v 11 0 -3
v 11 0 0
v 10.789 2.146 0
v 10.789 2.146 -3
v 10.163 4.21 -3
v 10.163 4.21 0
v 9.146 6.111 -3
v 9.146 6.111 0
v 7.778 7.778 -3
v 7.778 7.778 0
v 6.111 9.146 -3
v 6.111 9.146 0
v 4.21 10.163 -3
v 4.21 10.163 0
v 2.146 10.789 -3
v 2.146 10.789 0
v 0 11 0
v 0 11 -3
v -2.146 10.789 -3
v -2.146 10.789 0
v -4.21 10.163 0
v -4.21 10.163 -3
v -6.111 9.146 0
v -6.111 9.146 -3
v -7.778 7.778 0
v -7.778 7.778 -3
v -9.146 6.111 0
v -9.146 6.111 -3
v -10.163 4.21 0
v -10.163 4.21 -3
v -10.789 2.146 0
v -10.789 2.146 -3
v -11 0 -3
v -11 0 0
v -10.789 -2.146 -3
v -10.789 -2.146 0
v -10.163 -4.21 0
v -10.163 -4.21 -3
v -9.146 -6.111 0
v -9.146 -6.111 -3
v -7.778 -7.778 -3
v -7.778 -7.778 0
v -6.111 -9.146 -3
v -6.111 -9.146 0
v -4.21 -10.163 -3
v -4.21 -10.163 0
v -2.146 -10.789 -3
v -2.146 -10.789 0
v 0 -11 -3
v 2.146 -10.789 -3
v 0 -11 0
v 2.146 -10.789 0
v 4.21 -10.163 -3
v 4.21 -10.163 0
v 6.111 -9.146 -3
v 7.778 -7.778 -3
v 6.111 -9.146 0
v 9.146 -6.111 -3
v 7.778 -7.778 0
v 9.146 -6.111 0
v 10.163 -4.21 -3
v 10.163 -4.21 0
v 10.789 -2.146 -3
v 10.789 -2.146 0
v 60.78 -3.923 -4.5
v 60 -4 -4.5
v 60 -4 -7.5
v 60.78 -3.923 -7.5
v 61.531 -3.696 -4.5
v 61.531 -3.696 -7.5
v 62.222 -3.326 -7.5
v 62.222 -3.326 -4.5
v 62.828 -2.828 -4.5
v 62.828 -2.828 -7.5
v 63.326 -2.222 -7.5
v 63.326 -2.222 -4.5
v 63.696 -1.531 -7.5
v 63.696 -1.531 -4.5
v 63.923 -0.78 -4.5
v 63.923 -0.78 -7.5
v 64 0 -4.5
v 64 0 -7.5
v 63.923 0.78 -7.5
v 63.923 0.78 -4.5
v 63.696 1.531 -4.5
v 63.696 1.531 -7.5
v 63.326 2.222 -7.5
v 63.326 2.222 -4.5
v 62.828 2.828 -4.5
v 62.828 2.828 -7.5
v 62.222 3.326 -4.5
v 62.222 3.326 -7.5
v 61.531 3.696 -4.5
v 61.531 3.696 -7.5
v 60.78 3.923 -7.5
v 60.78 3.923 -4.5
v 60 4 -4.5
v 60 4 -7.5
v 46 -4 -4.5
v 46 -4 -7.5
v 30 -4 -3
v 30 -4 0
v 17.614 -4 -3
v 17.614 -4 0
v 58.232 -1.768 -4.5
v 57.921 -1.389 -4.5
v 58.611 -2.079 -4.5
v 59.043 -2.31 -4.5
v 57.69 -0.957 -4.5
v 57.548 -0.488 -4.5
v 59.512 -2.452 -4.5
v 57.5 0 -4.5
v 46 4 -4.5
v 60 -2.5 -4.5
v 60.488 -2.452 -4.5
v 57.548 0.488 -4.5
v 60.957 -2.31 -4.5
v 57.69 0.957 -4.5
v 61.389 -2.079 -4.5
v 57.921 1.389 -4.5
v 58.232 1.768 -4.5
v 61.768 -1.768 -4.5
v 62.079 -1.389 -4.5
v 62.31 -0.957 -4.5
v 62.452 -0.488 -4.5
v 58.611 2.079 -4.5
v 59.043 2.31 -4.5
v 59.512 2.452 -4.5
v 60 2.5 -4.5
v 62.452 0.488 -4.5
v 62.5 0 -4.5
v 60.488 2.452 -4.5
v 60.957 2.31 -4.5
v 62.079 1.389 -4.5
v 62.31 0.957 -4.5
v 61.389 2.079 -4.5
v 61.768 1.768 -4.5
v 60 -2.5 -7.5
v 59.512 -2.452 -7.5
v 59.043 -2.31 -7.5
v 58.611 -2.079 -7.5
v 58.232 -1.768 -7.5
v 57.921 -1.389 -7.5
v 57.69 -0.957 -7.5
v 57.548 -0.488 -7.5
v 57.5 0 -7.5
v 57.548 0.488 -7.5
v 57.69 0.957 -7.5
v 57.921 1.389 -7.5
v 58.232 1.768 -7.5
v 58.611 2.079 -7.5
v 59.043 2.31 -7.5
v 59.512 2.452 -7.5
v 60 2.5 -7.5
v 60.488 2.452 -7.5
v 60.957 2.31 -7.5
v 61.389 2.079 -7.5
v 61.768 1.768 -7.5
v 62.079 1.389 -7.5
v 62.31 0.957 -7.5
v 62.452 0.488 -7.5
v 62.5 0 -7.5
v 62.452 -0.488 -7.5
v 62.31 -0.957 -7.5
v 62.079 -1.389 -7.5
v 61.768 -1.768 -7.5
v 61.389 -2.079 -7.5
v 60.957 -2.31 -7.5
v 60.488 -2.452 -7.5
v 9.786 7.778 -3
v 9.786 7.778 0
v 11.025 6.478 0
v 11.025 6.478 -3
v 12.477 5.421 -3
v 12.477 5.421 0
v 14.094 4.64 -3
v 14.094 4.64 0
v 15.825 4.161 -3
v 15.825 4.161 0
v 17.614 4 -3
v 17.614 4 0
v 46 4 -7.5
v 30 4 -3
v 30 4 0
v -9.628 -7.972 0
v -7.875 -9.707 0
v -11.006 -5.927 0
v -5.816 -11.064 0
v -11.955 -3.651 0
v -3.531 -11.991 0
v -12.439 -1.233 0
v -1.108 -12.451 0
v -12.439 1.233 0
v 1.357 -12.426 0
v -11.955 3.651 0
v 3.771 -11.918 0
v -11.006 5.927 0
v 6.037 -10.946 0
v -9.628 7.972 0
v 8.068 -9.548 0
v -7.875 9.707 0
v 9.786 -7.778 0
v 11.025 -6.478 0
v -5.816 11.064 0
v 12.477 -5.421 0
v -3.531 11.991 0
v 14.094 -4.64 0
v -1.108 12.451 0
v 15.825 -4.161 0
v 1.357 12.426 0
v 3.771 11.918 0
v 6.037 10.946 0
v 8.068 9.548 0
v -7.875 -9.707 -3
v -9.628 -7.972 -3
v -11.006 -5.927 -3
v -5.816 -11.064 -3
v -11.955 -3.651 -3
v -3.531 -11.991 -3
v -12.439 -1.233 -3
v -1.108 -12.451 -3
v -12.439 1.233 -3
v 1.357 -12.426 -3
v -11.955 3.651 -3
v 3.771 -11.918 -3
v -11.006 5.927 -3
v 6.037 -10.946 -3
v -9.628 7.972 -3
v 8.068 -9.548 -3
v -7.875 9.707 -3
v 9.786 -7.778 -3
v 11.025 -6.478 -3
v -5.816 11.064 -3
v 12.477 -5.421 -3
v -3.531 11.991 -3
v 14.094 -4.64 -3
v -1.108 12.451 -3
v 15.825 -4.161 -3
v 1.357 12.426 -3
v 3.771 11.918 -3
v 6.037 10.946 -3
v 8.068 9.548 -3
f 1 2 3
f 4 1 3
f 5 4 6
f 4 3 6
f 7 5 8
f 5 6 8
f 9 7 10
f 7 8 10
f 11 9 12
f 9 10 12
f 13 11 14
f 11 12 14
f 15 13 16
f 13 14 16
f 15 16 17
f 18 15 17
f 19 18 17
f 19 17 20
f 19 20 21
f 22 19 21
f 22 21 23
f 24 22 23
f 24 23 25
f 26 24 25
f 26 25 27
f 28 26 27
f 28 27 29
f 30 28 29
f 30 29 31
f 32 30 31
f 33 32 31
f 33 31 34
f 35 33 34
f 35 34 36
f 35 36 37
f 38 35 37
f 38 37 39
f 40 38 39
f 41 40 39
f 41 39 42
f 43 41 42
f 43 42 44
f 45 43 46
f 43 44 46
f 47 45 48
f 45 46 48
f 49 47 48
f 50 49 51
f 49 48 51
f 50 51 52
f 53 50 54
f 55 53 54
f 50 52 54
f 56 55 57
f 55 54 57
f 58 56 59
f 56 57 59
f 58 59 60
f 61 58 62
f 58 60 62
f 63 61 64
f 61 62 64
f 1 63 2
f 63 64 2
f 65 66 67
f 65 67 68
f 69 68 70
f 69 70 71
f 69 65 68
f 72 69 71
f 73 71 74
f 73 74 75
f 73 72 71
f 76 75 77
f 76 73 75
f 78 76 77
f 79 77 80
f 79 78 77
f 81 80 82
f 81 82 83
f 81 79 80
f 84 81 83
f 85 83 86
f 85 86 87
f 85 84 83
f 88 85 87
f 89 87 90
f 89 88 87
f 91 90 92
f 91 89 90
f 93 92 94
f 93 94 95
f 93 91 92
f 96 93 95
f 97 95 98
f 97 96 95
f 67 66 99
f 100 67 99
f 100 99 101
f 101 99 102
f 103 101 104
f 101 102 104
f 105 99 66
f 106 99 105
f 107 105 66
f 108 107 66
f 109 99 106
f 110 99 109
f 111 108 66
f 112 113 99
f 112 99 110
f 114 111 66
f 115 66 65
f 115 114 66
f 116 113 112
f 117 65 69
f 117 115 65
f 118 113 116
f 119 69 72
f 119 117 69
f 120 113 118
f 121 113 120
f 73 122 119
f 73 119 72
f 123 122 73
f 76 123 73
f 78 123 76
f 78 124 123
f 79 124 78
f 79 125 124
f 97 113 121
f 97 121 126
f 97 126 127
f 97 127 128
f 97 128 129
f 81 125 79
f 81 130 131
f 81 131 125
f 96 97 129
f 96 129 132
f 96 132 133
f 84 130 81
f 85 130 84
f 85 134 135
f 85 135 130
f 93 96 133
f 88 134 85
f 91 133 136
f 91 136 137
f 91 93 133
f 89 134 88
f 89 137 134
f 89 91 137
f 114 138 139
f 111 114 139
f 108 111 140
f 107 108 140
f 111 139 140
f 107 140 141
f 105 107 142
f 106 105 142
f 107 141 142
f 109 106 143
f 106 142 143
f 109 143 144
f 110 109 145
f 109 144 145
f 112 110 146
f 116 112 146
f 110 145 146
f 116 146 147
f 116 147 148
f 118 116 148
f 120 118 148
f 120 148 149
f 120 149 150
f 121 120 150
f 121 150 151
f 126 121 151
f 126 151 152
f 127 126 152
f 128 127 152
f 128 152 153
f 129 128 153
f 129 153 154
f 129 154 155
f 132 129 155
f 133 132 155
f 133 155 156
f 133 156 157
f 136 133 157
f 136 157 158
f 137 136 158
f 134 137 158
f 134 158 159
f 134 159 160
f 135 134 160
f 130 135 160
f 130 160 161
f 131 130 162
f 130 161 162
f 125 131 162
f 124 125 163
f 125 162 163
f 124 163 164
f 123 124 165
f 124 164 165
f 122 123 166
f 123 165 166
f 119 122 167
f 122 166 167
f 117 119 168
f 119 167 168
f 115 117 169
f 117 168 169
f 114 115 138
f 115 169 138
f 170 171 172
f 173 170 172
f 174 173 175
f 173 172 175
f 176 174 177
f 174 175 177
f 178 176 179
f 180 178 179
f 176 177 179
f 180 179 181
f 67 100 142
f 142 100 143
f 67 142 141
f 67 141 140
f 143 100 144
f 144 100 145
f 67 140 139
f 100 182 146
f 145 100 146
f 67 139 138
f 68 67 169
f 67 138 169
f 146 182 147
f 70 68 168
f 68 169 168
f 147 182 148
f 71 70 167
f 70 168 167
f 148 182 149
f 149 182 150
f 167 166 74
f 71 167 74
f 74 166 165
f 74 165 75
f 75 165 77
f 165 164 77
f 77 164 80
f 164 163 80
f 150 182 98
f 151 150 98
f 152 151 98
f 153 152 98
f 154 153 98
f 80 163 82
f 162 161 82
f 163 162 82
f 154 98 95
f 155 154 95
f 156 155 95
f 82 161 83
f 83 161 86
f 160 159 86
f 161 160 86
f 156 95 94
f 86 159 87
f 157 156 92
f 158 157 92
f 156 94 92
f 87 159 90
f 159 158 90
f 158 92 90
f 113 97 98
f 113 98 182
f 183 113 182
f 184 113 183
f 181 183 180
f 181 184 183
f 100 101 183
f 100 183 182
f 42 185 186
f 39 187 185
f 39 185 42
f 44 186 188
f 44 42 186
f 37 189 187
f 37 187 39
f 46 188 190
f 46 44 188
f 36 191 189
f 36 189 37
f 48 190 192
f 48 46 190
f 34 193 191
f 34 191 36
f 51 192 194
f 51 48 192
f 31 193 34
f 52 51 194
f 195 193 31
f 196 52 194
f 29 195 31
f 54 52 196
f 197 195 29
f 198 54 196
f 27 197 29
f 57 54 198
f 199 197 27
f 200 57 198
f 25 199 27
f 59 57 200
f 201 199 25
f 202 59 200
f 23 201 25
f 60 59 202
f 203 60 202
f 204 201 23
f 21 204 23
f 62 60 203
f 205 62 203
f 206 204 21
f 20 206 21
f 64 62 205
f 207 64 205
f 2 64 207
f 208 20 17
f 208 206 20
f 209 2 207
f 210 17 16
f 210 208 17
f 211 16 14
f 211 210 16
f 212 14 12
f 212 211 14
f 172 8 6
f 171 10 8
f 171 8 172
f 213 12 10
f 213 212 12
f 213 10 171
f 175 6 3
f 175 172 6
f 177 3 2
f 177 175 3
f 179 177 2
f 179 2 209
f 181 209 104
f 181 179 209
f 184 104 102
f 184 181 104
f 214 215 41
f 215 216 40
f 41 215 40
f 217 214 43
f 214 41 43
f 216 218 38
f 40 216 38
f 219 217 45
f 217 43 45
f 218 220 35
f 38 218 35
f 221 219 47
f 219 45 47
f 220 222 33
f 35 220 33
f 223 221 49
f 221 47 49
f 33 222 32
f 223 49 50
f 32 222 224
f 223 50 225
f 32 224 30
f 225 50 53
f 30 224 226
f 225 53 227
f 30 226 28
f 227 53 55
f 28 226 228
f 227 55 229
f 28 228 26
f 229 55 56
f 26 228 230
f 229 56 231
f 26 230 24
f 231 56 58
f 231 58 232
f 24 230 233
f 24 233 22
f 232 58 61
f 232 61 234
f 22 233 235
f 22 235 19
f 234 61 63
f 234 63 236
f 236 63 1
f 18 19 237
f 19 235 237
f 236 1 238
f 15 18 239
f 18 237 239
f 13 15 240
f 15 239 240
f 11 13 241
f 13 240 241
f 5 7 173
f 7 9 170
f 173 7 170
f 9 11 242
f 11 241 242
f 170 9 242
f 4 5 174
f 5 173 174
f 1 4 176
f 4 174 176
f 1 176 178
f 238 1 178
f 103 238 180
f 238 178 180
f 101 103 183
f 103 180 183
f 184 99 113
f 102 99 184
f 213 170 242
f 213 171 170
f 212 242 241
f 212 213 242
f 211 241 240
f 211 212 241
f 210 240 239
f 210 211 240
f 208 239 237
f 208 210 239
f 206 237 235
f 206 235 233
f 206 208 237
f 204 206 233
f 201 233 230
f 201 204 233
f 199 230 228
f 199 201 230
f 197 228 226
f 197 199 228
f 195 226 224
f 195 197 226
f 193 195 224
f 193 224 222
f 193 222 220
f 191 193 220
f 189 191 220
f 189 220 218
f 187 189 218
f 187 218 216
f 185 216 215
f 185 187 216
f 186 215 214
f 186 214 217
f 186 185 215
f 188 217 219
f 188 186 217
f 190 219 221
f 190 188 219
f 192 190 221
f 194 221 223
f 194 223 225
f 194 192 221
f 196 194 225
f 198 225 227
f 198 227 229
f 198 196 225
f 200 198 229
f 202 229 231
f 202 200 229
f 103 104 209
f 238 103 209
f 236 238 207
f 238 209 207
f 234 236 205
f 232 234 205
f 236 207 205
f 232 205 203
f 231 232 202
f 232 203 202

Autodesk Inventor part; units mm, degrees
ref_plane "YZ Plane" through (0, 0, 0) normal (1, 0, 0) x (0, 1, 0)
ref_plane "XY Plane" through (0, 0, 0) normal (0, 0, 1) x (1, 0, 0)
sketch "Sketch1" plane through (0, 0, 0) normal (0, 0, 1) x (1, 0, 0)
  arc A0 (9.7855, 7.7778) -> (9.7855, -7.7778) centre (0, 0) ccw
  circle A1 centre (0, 0) radius 11
  arc A2 (60, -4) -> (60, 4) centre (60, 0) ccw
  line L0 (60, 4) -> (17.6139, 4) construction
  line L1 (60, -4) -> (17.6139, -4) construction
  arc A3 (17.6139, -4) -> (9.7855, -7.7778) centre (17.6139, -14) ccw
  arc A4 (9.7855, 7.7778) -> (17.6139, 4) centre (17.6139, 14) ccw
  line L2 (30, 4) -> (30, -4) construction
  line L3 (17.6139, -4) -> (17.6139, 4)
  point P0 (11.8427, 4)
  point P1 (11.8427, -4)
  point P2 (-12.5, 0)
  point P3 (30, 0)
  dimension "d0" = 25
  dimension "d1" = 22
  dimension "d2" = 4
  dimension "d3" = 10
  dimension "d4" = 60
  dimension "d17" = 42.5
extrude "Extrusion1" add sketch "Sketch1" against normal blind 3
ref_plane "Work Plane3" through (0, 0, 0) normal (0, 1, 0) x (-1, 0, 0)
sketch "Sketch7" plane through (0, 0, 0) normal (0, 1, 0) x (-1, 0, 0)
  line L0 (-17.6139, 0) -> (-17.6139, -3) projected
  line L1 (-17.6139, -3) -> (-30, -3)
  line L2 (-30, -3) -> (-46, -7.5)
  line L3 (-46, -7.5) -> (-60, -7.5)
  line L4 (-60, -7.5) -> (-60, -4.5)
  line L5 (-60, -4.5) -> (-46, -4.5)
  line L6 (-46, -4.5) -> (-30, 0)
  line L7 (-30, 0) -> (-17.6139, 0)
  line L8 (-17.6139, -3) -> (-17.6139, 0)
  point P0 (0, 0)
  point P1 (-60, -6)
  dimension "d19" = 4.5
  dimension "d20" = 14
  dimension "d21" = 60
  dimension "d22" = 3
extrude "Extrusion3" add sketch "Sketch7" along normal mid plane 8
sketch "Sketch8" plane through (46, 4, -4.5) normal (0, 0, 1) x (1, 0, 0)
  line L0 (14, -8) -> (14, 0) projected
  arc A0 (14, -8) -> (14, 0) centre (14, -4) ccw
  point P0 (-46, -4)
  dimension "d25" = 4
extrude "Extrusion4" add sketch "Sketch8" against normal up to surface (3 mm away)
sketch "Sketch9" plane through (46, -4, -4.5) normal (0, 0, 1) x (1, 0, 0)
  arc A0 (14, 0) -> (14, 8) centre (14, 4) ccw projected
  point P0 (-46, 4)
hole "Hole1" at (60, 0, -4.5) direction (0, 0, -1) diameter 5 depth 3
properties part number "15_2"
